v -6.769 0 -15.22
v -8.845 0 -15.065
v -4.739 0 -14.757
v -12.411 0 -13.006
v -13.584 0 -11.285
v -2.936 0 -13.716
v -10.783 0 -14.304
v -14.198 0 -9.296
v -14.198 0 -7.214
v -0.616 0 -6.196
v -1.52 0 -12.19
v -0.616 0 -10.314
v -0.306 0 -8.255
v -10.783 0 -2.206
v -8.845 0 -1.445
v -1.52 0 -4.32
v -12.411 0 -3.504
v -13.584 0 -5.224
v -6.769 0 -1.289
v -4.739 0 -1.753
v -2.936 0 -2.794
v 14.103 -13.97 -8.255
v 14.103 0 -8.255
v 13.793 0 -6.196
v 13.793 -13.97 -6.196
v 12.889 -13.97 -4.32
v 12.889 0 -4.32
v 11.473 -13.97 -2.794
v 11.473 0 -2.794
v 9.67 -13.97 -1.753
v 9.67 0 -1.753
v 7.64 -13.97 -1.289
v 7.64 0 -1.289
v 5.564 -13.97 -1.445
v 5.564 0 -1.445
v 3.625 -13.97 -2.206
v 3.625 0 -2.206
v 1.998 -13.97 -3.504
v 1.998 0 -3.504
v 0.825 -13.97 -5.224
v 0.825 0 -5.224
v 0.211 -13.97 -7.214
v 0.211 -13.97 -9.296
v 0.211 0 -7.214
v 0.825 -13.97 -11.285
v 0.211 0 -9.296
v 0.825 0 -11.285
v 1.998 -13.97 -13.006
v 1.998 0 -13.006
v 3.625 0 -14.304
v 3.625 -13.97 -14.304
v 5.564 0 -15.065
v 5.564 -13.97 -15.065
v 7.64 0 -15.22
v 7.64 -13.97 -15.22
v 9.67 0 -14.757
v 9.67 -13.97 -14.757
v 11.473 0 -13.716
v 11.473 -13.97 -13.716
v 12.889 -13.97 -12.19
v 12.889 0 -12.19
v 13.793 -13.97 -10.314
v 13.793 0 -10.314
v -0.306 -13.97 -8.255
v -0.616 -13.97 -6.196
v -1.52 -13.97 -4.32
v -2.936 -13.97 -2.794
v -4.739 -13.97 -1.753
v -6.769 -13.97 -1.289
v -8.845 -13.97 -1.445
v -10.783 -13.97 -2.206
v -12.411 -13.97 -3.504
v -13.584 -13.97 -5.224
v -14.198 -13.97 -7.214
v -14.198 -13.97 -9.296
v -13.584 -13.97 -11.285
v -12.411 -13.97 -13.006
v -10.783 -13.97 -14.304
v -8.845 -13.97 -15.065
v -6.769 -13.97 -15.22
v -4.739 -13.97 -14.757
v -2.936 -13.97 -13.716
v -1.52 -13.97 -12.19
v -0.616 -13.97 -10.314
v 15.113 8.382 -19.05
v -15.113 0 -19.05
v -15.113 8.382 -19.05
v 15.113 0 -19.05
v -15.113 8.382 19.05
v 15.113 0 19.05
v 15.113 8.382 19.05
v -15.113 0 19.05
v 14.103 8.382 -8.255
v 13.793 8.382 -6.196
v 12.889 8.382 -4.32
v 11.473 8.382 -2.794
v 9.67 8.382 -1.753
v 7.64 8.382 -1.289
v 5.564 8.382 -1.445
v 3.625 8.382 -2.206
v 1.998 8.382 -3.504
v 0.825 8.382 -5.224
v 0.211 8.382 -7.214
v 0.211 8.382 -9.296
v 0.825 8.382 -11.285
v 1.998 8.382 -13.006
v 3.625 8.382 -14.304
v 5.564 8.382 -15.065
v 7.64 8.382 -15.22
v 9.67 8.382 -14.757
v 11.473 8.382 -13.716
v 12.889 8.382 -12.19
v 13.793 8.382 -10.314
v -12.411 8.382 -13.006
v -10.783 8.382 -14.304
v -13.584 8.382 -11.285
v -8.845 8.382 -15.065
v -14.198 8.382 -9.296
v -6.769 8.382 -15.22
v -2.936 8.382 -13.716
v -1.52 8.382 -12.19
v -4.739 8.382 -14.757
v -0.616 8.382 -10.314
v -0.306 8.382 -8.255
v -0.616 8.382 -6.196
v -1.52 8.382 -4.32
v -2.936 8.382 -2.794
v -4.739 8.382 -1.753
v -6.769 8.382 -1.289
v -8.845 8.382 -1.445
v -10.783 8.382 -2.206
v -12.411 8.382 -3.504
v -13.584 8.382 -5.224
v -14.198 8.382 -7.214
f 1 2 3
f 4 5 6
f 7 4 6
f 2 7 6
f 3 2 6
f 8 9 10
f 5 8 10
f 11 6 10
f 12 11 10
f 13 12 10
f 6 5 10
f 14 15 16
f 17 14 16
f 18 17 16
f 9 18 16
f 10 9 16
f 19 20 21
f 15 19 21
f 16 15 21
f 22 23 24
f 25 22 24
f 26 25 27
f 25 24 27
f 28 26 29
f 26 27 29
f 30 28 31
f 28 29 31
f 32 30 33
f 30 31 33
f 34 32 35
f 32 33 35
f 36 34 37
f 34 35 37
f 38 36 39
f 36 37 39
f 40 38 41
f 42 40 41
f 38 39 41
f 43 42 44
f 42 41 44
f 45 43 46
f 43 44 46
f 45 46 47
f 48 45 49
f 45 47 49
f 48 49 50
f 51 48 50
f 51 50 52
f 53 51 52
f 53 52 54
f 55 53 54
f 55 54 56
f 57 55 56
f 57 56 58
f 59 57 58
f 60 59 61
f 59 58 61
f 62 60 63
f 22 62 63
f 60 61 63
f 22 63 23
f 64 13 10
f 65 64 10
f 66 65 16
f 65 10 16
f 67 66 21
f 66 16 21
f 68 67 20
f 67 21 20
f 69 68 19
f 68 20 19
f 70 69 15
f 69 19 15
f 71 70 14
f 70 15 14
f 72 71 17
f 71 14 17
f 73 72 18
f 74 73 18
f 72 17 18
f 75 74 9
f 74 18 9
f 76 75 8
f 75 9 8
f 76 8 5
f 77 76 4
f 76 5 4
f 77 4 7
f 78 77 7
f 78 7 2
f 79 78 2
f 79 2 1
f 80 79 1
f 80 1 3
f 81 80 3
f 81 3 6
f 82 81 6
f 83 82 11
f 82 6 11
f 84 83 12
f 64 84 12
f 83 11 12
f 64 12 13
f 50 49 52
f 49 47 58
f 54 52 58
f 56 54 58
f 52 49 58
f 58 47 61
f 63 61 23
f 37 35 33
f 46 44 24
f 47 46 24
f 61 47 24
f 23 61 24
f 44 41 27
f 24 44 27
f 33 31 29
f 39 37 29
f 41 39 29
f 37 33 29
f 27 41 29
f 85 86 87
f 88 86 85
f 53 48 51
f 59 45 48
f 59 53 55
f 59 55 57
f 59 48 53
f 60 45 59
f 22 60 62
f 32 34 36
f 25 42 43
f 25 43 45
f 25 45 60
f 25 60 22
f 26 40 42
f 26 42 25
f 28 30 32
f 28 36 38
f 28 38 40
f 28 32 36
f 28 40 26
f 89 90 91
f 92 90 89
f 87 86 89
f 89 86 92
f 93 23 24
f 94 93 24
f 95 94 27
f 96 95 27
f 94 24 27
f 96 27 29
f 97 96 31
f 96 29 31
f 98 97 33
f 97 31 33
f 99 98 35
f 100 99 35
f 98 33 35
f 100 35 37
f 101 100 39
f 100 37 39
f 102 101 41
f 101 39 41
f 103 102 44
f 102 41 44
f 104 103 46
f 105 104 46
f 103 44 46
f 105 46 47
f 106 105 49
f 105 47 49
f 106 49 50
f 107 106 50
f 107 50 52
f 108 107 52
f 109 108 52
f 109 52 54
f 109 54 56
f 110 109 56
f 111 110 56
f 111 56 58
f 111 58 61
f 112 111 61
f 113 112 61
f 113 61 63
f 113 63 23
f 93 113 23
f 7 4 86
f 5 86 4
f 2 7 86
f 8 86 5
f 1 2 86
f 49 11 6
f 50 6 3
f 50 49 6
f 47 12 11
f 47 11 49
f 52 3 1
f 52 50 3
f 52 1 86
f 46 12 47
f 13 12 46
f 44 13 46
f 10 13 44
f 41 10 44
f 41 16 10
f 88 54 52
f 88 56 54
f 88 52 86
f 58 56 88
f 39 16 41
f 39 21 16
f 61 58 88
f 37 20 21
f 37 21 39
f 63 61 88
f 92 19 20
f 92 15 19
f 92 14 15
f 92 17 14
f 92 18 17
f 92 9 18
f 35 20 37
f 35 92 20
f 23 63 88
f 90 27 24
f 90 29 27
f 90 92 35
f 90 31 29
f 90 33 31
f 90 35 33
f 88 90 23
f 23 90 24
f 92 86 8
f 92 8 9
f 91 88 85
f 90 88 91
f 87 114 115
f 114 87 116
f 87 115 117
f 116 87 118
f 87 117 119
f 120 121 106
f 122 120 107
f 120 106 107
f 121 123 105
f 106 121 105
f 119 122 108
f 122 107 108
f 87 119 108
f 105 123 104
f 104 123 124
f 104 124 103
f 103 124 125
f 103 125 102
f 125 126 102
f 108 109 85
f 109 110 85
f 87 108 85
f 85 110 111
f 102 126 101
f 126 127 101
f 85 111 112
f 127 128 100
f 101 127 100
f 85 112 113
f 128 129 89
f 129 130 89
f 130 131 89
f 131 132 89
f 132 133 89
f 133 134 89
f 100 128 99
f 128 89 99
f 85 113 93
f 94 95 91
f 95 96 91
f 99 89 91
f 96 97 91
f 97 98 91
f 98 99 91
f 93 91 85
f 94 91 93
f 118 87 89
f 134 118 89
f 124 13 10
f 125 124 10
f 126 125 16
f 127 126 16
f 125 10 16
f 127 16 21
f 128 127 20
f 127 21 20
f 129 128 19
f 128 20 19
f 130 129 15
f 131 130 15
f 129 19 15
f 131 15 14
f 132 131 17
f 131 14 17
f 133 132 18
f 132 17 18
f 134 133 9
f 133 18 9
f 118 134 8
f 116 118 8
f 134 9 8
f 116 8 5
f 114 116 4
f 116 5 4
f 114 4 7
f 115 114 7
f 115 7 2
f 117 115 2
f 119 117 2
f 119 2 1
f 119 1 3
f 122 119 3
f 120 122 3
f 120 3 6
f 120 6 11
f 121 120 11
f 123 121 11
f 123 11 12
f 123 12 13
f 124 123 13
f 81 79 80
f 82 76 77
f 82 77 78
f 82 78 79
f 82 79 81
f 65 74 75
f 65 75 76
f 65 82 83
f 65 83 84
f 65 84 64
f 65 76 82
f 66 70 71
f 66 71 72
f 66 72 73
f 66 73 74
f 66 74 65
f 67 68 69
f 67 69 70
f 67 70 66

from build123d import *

# Parameters (mm, degrees)
F0_R     = 6.985
F1_DEPTH = 13.97
F0_W     = 0.508
F0_H     = 38.1
F0_W_2   = 29.21
F2_DEPTH = 3.81
F3_DEPTH = 8.382


with BuildPart() as f1:
    # F0 (on Front) → F1 (new body)
    with BuildSketch(Plane.XZ):
        with Locations((7.117974, -8.254721)):
            Circle(F0_R)
        with Locations((-7.290998, -8.254721)):
            Circle(F0_R)
    extrude(amount=F1_DEPTH)



with BuildPart() as f2:
    # F0 (on Front) → F2 (new body)
    with BuildSketch(Plane.XZ):
        with Locations((14.859, 0)):
            Rectangle(F0_W, F0_H)
        Rectangle(F0_W_2, F0_H)
        with Locations((-7.290998, -8.254721)):
            Circle(F0_R, mode=Mode.SUBTRACT)
        with Locations((7.117974, -8.254721)):
            Circle(F0_R, mode=Mode.SUBTRACT)
        with Locations((-14.859, 0)):
            Rectangle(F0_W, F0_H)
    extrude(amount=-F2_DEPTH)


with BuildPart() as f1_1:
    add(f1.part)

    add(f2.part)  # F3 merges F2
    # F0 (on Front) → F3 (join)
    with BuildSketch(Plane.XZ):
        with Locations((14.859, 0)):
            Rectangle(F0_W, F0_H)
        Rectangle(F0_W_2, F0_H)
        with Locations((-7.290998, -8.254721)):
            Circle(F0_R, mode=Mode.SUBTRACT)
        with Locations((7.117974, -8.254721)):
            Circle(F0_R, mode=Mode.SUBTRACT)
        with Locations((-14.859, 0)):
            Rectangle(F0_W, F0_H)
    extrude(amount=-F3_DEPTH)


solid = f1_1.part
